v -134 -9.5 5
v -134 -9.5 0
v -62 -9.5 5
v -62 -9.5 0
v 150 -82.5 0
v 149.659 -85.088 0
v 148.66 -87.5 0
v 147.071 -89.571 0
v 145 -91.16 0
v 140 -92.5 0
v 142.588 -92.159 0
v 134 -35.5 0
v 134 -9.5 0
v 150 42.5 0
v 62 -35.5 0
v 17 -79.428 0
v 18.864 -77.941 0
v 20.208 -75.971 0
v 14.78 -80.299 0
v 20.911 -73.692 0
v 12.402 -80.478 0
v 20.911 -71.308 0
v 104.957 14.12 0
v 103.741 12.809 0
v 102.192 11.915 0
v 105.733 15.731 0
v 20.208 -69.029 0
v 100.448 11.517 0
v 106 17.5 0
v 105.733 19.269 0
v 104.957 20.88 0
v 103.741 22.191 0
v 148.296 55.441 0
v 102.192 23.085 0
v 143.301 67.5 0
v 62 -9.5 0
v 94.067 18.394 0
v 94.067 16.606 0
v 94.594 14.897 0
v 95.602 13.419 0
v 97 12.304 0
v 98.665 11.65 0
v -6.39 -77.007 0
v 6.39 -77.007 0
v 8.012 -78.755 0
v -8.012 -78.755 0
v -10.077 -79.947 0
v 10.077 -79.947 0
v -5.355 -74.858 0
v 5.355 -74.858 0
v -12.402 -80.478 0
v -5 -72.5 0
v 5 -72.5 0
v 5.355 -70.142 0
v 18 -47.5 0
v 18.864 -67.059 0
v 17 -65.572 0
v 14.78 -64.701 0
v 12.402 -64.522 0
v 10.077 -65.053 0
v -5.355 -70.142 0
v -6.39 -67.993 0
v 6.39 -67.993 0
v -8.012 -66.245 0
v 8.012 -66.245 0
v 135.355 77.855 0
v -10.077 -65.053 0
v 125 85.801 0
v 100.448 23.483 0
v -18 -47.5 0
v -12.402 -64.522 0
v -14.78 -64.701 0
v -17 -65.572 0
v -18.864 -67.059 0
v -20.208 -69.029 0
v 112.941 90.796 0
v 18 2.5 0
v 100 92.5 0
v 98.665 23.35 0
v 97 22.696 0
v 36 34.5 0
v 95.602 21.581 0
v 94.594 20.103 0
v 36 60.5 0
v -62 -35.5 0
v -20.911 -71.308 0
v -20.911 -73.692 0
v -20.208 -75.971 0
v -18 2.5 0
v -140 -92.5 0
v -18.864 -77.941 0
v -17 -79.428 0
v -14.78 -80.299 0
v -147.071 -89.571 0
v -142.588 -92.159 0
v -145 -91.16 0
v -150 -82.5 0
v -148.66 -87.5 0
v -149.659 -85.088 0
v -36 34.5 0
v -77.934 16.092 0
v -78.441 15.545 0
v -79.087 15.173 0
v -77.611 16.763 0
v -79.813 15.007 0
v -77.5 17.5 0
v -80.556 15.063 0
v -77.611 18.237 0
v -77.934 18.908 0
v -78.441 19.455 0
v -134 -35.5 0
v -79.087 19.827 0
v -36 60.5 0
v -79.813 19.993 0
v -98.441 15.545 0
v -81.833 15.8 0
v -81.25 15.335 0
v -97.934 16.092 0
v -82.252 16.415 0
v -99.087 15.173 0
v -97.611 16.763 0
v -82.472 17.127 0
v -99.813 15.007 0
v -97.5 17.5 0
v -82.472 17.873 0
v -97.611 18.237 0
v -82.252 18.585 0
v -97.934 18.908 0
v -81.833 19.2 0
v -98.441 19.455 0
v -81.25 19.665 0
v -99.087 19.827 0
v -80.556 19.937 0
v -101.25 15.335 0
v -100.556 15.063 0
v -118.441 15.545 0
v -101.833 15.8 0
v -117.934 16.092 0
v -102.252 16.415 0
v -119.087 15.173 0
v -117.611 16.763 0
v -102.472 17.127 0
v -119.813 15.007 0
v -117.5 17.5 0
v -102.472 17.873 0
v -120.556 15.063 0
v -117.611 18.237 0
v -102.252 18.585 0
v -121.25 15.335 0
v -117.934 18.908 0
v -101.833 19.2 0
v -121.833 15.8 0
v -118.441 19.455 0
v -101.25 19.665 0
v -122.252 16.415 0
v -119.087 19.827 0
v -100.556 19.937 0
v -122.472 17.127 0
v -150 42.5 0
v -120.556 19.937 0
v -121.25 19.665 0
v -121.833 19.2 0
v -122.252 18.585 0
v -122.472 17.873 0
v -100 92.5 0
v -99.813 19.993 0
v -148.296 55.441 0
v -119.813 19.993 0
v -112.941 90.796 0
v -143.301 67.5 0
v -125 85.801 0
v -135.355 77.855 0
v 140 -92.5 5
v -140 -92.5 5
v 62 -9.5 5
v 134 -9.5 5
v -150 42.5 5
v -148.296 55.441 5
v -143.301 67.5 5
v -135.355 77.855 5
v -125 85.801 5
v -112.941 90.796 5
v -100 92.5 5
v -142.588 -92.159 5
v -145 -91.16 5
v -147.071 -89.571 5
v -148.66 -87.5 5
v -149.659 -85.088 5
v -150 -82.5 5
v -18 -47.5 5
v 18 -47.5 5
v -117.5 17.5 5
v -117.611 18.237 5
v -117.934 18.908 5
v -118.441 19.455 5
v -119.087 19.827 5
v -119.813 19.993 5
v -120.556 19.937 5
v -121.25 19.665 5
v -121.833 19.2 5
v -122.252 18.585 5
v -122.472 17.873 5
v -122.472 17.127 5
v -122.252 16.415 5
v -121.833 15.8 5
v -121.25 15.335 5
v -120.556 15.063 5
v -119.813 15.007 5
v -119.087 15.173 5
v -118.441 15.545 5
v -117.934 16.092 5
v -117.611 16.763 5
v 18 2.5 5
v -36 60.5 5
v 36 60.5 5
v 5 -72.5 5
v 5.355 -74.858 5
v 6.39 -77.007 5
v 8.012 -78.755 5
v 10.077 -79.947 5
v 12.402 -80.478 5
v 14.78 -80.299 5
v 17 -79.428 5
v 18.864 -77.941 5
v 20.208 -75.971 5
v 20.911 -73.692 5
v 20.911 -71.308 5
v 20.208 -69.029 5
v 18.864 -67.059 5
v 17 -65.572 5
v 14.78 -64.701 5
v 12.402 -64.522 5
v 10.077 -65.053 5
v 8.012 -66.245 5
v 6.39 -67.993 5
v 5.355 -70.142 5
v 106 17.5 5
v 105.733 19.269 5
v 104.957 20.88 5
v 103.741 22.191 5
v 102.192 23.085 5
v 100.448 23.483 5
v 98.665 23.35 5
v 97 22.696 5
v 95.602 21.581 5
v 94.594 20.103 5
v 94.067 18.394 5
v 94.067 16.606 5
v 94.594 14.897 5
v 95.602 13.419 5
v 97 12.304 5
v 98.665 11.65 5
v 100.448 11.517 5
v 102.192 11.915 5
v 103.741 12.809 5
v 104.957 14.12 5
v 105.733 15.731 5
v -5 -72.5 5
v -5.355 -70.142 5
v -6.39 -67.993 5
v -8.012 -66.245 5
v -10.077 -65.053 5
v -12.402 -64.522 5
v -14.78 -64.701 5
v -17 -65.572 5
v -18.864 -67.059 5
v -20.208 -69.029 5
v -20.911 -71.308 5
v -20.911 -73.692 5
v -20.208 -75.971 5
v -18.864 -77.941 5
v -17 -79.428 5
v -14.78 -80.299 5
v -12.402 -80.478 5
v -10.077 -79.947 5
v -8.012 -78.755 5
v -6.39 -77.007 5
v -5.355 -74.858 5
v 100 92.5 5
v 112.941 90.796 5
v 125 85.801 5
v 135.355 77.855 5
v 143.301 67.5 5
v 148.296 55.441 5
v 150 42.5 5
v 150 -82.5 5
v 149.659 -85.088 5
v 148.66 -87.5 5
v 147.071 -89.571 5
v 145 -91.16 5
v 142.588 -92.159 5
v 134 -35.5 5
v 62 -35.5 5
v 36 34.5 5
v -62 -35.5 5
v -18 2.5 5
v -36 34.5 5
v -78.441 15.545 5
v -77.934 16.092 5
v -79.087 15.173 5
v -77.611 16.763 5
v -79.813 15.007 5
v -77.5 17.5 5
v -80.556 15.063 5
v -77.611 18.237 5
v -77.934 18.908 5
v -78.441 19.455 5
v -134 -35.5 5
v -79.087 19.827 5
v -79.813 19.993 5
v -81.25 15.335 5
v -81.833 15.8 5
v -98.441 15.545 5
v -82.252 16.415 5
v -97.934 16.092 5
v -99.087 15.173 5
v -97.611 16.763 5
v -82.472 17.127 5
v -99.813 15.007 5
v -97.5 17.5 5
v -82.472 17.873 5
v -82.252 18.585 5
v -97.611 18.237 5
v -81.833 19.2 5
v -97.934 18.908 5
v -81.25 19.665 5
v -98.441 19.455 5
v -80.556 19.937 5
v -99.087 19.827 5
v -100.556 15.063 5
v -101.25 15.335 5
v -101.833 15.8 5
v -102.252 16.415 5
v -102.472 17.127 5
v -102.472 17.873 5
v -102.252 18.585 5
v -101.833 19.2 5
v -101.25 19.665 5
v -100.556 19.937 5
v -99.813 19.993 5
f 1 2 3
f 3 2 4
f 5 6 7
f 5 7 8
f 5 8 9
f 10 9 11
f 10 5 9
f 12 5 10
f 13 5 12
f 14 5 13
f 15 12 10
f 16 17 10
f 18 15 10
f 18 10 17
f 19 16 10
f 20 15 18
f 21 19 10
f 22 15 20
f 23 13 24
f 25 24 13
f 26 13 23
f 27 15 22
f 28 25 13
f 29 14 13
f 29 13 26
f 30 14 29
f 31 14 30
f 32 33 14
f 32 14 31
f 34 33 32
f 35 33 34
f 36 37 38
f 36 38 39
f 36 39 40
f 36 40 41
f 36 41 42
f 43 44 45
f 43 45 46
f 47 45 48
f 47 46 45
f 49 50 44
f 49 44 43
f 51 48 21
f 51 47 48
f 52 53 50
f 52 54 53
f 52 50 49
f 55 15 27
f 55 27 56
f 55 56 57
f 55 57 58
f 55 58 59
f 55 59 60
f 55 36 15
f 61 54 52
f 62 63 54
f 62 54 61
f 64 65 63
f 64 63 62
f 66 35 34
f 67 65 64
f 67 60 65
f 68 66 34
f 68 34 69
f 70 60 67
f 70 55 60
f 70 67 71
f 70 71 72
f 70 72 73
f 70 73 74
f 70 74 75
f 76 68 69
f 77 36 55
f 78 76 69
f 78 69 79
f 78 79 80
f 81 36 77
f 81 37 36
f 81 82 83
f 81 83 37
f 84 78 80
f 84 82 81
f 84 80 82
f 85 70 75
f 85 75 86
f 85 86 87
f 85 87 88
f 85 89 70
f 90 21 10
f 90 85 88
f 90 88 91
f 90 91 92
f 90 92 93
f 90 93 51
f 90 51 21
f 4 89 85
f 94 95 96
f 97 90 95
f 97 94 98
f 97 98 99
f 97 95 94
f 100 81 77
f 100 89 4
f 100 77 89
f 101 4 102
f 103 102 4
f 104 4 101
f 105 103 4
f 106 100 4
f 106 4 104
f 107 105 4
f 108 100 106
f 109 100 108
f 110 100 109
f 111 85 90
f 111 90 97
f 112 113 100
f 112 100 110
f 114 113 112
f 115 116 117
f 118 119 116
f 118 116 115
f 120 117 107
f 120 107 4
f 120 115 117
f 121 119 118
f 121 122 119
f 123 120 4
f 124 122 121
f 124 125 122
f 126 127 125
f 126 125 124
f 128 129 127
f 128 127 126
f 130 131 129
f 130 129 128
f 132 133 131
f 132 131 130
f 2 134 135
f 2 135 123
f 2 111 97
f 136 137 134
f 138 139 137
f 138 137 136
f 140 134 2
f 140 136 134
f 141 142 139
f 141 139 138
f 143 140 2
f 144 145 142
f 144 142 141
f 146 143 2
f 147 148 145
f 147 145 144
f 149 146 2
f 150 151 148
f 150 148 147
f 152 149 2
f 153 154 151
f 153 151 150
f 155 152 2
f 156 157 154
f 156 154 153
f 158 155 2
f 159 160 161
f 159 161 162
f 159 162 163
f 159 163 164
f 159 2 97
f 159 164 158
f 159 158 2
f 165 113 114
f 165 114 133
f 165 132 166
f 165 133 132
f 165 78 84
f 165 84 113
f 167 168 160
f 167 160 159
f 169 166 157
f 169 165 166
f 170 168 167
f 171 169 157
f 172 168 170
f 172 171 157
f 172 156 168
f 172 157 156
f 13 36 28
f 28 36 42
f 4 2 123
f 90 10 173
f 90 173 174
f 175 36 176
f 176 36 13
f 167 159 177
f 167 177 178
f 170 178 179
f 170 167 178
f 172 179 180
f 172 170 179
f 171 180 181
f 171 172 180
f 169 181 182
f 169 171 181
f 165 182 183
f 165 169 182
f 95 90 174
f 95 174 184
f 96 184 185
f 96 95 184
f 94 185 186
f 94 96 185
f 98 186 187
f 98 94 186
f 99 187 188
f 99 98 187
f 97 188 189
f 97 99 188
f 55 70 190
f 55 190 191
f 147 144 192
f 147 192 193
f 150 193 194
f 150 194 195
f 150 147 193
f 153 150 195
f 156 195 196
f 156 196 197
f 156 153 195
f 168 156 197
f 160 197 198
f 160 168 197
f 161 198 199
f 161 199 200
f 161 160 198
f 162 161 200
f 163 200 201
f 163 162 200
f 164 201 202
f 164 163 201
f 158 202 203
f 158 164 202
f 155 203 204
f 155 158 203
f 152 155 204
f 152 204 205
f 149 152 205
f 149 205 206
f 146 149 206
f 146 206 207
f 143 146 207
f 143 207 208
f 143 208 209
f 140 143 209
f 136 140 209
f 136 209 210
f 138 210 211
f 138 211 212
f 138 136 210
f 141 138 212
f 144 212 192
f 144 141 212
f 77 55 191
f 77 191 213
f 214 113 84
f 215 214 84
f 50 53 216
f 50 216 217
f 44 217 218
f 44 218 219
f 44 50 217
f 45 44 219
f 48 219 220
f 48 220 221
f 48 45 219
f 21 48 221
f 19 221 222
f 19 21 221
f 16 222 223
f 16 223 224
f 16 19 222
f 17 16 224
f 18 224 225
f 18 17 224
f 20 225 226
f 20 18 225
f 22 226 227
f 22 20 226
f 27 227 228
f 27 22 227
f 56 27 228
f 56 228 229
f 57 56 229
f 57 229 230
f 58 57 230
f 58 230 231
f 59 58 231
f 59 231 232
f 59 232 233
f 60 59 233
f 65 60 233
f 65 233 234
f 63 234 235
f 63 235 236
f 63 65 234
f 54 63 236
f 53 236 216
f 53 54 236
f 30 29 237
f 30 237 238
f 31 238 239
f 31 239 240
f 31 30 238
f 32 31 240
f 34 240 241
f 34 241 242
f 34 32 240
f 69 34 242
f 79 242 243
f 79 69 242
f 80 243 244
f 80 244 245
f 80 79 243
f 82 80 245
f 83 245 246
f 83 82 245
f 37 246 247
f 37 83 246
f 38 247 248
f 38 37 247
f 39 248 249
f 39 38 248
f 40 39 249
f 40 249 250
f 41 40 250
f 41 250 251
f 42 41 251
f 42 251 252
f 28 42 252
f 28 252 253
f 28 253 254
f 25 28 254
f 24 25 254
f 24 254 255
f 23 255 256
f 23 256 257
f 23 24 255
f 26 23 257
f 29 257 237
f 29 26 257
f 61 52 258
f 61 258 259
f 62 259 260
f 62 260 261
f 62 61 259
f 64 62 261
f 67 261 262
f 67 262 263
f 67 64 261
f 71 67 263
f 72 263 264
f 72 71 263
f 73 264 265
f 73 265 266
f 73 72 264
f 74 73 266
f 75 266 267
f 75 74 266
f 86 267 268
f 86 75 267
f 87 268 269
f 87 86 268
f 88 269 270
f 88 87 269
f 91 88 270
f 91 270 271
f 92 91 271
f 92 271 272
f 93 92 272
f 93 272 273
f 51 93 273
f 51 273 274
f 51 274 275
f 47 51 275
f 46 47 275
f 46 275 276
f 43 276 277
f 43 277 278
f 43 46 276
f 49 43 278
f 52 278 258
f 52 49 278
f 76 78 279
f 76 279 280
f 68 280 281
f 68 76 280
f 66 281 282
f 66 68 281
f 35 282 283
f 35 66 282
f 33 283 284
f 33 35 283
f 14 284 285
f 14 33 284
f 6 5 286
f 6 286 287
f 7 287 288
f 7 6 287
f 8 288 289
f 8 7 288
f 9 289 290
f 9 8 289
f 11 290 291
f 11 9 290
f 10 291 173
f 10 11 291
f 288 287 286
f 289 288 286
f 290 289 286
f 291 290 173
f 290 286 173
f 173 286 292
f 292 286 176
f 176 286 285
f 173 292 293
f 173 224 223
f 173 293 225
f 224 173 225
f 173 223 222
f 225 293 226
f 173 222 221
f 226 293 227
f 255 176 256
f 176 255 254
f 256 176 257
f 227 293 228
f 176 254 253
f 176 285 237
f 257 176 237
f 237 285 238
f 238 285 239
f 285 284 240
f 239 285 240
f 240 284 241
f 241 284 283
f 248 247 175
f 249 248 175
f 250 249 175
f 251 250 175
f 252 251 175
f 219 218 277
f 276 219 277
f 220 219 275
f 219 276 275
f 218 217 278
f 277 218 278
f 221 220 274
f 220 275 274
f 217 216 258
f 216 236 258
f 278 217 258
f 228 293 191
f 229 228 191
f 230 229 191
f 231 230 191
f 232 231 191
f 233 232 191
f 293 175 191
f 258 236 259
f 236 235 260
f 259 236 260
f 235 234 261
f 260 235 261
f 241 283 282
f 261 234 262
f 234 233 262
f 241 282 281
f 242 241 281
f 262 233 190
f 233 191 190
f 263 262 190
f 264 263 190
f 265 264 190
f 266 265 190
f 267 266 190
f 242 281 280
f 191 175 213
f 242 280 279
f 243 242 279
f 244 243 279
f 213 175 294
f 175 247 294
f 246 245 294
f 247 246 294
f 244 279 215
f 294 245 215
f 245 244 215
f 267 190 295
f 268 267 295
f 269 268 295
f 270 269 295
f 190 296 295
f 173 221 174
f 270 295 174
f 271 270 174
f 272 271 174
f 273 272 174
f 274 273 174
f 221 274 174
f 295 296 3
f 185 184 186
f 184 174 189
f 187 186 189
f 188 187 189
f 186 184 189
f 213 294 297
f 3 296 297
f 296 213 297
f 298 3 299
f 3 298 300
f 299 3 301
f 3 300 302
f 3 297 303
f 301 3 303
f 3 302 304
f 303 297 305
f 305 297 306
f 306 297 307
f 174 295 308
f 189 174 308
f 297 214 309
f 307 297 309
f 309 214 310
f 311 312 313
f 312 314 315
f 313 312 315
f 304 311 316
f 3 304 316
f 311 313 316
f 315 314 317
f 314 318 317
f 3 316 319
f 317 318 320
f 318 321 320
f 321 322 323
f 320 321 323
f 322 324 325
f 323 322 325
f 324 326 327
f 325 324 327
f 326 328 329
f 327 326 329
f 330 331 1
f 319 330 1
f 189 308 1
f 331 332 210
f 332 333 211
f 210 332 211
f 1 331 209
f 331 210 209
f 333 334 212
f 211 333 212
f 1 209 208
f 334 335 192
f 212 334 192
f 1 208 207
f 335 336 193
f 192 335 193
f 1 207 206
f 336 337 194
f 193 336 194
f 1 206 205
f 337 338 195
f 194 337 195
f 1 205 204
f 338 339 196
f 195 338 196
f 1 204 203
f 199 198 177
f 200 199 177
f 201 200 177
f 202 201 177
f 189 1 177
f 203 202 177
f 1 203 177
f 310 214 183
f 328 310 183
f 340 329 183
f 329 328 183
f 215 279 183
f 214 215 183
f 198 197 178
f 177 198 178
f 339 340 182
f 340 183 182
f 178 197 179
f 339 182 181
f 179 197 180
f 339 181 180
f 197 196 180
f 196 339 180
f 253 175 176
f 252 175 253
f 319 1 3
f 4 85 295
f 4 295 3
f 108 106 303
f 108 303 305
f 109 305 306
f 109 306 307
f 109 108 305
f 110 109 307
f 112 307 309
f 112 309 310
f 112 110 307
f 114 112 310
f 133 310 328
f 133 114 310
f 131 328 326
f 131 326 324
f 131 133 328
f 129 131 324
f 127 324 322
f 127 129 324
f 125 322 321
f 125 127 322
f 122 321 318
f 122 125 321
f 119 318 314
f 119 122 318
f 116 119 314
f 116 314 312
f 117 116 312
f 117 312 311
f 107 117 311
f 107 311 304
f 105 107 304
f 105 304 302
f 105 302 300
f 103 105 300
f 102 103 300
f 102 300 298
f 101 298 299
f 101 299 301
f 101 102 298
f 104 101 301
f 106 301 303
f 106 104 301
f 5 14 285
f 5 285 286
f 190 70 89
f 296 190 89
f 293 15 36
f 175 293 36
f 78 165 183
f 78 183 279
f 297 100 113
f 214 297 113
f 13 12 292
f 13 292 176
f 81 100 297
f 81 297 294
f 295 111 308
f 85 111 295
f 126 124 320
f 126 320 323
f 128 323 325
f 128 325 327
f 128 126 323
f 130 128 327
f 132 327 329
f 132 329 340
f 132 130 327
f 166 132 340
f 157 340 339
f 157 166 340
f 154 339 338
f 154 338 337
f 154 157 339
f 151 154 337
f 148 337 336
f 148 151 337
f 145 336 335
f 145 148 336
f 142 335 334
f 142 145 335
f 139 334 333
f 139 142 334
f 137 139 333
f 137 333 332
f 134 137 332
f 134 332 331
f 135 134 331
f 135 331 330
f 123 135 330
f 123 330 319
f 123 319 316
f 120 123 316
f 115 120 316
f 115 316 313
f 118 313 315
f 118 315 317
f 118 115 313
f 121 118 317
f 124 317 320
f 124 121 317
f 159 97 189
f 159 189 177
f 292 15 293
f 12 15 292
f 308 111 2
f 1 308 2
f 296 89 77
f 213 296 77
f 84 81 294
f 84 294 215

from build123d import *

# Parameters (mm, degrees)
SKETCH1_R           = 8
SKETCH1_R_2         = 6
SKETCH1_R_3         = 2.5
SKETCH1_W           = 72
SKETCH1_H           = 26
SKETCH1_W_2         = 36
SKETCH1_H_2         = 50
BOSS_EXTRUDE1_DEPTH = 5


with BuildPart() as part:
    # Sketch1 → Boss-Extrude1 (new body)
    with BuildSketch(Plane.XY):
        with BuildLine():
            Line((140, -92.5), (-140, -92.5))
            ThreePointArc((-140, -92.5), (-147.071067812, -89.571067812), (-150, -82.5))
            Line((-150, -82.5), (-150, 42.5))
            ThreePointArc((-150, 42.5), (-135.355339059, 77.855339059), (-100, 92.5))
            Line((-100, 92.5), (100, 92.5))
            ThreePointArc((100, 92.5), (135.355339059, 77.855339059), (150, 42.5))
            Line((150, 42.5), (150, -82.5))
            ThreePointArc((150, -82.5), (147.071067812, -89.571067812), (140, -92.5))
        make_face()
        with Locations((-13, -72.5)):
            Circle(SKETCH1_R, mode=Mode.SUBTRACT)
        with Locations(Location((13, -72.5, 0), (0, 0, 180))):
            Circle(SKETCH1_R, mode=Mode.SUBTRACT)
        with Locations((100, 17.5)):
            Circle(SKETCH1_R_2, mode=Mode.SUBTRACT)
        with Locations((-120, 17.5)):
            Circle(SKETCH1_R_3, mode=Mode.SUBTRACT)
        with Locations((-100, 17.5)):
            Circle(SKETCH1_R_3, mode=Mode.SUBTRACT)
        with Locations((-80, 17.5)):
            Circle(SKETCH1_R_3, mode=Mode.SUBTRACT)
        with Locations((-98, -22.5)):
            Rectangle(SKETCH1_W, SKETCH1_H, mode=Mode.SUBTRACT)
        with Locations((0, 47.5)):
            Rectangle(SKETCH1_W, SKETCH1_H, mode=Mode.SUBTRACT)
        with Locations((98, -22.5)):
            Rectangle(SKETCH1_W, SKETCH1_H, mode=Mode.SUBTRACT)
        with Locations((0, -22.5)):
            Rectangle(SKETCH1_W_2, SKETCH1_H_2, mode=Mode.SUBTRACT)
    extrude(amount=BOSS_EXTRUDE1_DEPTH)


solid = part.part
